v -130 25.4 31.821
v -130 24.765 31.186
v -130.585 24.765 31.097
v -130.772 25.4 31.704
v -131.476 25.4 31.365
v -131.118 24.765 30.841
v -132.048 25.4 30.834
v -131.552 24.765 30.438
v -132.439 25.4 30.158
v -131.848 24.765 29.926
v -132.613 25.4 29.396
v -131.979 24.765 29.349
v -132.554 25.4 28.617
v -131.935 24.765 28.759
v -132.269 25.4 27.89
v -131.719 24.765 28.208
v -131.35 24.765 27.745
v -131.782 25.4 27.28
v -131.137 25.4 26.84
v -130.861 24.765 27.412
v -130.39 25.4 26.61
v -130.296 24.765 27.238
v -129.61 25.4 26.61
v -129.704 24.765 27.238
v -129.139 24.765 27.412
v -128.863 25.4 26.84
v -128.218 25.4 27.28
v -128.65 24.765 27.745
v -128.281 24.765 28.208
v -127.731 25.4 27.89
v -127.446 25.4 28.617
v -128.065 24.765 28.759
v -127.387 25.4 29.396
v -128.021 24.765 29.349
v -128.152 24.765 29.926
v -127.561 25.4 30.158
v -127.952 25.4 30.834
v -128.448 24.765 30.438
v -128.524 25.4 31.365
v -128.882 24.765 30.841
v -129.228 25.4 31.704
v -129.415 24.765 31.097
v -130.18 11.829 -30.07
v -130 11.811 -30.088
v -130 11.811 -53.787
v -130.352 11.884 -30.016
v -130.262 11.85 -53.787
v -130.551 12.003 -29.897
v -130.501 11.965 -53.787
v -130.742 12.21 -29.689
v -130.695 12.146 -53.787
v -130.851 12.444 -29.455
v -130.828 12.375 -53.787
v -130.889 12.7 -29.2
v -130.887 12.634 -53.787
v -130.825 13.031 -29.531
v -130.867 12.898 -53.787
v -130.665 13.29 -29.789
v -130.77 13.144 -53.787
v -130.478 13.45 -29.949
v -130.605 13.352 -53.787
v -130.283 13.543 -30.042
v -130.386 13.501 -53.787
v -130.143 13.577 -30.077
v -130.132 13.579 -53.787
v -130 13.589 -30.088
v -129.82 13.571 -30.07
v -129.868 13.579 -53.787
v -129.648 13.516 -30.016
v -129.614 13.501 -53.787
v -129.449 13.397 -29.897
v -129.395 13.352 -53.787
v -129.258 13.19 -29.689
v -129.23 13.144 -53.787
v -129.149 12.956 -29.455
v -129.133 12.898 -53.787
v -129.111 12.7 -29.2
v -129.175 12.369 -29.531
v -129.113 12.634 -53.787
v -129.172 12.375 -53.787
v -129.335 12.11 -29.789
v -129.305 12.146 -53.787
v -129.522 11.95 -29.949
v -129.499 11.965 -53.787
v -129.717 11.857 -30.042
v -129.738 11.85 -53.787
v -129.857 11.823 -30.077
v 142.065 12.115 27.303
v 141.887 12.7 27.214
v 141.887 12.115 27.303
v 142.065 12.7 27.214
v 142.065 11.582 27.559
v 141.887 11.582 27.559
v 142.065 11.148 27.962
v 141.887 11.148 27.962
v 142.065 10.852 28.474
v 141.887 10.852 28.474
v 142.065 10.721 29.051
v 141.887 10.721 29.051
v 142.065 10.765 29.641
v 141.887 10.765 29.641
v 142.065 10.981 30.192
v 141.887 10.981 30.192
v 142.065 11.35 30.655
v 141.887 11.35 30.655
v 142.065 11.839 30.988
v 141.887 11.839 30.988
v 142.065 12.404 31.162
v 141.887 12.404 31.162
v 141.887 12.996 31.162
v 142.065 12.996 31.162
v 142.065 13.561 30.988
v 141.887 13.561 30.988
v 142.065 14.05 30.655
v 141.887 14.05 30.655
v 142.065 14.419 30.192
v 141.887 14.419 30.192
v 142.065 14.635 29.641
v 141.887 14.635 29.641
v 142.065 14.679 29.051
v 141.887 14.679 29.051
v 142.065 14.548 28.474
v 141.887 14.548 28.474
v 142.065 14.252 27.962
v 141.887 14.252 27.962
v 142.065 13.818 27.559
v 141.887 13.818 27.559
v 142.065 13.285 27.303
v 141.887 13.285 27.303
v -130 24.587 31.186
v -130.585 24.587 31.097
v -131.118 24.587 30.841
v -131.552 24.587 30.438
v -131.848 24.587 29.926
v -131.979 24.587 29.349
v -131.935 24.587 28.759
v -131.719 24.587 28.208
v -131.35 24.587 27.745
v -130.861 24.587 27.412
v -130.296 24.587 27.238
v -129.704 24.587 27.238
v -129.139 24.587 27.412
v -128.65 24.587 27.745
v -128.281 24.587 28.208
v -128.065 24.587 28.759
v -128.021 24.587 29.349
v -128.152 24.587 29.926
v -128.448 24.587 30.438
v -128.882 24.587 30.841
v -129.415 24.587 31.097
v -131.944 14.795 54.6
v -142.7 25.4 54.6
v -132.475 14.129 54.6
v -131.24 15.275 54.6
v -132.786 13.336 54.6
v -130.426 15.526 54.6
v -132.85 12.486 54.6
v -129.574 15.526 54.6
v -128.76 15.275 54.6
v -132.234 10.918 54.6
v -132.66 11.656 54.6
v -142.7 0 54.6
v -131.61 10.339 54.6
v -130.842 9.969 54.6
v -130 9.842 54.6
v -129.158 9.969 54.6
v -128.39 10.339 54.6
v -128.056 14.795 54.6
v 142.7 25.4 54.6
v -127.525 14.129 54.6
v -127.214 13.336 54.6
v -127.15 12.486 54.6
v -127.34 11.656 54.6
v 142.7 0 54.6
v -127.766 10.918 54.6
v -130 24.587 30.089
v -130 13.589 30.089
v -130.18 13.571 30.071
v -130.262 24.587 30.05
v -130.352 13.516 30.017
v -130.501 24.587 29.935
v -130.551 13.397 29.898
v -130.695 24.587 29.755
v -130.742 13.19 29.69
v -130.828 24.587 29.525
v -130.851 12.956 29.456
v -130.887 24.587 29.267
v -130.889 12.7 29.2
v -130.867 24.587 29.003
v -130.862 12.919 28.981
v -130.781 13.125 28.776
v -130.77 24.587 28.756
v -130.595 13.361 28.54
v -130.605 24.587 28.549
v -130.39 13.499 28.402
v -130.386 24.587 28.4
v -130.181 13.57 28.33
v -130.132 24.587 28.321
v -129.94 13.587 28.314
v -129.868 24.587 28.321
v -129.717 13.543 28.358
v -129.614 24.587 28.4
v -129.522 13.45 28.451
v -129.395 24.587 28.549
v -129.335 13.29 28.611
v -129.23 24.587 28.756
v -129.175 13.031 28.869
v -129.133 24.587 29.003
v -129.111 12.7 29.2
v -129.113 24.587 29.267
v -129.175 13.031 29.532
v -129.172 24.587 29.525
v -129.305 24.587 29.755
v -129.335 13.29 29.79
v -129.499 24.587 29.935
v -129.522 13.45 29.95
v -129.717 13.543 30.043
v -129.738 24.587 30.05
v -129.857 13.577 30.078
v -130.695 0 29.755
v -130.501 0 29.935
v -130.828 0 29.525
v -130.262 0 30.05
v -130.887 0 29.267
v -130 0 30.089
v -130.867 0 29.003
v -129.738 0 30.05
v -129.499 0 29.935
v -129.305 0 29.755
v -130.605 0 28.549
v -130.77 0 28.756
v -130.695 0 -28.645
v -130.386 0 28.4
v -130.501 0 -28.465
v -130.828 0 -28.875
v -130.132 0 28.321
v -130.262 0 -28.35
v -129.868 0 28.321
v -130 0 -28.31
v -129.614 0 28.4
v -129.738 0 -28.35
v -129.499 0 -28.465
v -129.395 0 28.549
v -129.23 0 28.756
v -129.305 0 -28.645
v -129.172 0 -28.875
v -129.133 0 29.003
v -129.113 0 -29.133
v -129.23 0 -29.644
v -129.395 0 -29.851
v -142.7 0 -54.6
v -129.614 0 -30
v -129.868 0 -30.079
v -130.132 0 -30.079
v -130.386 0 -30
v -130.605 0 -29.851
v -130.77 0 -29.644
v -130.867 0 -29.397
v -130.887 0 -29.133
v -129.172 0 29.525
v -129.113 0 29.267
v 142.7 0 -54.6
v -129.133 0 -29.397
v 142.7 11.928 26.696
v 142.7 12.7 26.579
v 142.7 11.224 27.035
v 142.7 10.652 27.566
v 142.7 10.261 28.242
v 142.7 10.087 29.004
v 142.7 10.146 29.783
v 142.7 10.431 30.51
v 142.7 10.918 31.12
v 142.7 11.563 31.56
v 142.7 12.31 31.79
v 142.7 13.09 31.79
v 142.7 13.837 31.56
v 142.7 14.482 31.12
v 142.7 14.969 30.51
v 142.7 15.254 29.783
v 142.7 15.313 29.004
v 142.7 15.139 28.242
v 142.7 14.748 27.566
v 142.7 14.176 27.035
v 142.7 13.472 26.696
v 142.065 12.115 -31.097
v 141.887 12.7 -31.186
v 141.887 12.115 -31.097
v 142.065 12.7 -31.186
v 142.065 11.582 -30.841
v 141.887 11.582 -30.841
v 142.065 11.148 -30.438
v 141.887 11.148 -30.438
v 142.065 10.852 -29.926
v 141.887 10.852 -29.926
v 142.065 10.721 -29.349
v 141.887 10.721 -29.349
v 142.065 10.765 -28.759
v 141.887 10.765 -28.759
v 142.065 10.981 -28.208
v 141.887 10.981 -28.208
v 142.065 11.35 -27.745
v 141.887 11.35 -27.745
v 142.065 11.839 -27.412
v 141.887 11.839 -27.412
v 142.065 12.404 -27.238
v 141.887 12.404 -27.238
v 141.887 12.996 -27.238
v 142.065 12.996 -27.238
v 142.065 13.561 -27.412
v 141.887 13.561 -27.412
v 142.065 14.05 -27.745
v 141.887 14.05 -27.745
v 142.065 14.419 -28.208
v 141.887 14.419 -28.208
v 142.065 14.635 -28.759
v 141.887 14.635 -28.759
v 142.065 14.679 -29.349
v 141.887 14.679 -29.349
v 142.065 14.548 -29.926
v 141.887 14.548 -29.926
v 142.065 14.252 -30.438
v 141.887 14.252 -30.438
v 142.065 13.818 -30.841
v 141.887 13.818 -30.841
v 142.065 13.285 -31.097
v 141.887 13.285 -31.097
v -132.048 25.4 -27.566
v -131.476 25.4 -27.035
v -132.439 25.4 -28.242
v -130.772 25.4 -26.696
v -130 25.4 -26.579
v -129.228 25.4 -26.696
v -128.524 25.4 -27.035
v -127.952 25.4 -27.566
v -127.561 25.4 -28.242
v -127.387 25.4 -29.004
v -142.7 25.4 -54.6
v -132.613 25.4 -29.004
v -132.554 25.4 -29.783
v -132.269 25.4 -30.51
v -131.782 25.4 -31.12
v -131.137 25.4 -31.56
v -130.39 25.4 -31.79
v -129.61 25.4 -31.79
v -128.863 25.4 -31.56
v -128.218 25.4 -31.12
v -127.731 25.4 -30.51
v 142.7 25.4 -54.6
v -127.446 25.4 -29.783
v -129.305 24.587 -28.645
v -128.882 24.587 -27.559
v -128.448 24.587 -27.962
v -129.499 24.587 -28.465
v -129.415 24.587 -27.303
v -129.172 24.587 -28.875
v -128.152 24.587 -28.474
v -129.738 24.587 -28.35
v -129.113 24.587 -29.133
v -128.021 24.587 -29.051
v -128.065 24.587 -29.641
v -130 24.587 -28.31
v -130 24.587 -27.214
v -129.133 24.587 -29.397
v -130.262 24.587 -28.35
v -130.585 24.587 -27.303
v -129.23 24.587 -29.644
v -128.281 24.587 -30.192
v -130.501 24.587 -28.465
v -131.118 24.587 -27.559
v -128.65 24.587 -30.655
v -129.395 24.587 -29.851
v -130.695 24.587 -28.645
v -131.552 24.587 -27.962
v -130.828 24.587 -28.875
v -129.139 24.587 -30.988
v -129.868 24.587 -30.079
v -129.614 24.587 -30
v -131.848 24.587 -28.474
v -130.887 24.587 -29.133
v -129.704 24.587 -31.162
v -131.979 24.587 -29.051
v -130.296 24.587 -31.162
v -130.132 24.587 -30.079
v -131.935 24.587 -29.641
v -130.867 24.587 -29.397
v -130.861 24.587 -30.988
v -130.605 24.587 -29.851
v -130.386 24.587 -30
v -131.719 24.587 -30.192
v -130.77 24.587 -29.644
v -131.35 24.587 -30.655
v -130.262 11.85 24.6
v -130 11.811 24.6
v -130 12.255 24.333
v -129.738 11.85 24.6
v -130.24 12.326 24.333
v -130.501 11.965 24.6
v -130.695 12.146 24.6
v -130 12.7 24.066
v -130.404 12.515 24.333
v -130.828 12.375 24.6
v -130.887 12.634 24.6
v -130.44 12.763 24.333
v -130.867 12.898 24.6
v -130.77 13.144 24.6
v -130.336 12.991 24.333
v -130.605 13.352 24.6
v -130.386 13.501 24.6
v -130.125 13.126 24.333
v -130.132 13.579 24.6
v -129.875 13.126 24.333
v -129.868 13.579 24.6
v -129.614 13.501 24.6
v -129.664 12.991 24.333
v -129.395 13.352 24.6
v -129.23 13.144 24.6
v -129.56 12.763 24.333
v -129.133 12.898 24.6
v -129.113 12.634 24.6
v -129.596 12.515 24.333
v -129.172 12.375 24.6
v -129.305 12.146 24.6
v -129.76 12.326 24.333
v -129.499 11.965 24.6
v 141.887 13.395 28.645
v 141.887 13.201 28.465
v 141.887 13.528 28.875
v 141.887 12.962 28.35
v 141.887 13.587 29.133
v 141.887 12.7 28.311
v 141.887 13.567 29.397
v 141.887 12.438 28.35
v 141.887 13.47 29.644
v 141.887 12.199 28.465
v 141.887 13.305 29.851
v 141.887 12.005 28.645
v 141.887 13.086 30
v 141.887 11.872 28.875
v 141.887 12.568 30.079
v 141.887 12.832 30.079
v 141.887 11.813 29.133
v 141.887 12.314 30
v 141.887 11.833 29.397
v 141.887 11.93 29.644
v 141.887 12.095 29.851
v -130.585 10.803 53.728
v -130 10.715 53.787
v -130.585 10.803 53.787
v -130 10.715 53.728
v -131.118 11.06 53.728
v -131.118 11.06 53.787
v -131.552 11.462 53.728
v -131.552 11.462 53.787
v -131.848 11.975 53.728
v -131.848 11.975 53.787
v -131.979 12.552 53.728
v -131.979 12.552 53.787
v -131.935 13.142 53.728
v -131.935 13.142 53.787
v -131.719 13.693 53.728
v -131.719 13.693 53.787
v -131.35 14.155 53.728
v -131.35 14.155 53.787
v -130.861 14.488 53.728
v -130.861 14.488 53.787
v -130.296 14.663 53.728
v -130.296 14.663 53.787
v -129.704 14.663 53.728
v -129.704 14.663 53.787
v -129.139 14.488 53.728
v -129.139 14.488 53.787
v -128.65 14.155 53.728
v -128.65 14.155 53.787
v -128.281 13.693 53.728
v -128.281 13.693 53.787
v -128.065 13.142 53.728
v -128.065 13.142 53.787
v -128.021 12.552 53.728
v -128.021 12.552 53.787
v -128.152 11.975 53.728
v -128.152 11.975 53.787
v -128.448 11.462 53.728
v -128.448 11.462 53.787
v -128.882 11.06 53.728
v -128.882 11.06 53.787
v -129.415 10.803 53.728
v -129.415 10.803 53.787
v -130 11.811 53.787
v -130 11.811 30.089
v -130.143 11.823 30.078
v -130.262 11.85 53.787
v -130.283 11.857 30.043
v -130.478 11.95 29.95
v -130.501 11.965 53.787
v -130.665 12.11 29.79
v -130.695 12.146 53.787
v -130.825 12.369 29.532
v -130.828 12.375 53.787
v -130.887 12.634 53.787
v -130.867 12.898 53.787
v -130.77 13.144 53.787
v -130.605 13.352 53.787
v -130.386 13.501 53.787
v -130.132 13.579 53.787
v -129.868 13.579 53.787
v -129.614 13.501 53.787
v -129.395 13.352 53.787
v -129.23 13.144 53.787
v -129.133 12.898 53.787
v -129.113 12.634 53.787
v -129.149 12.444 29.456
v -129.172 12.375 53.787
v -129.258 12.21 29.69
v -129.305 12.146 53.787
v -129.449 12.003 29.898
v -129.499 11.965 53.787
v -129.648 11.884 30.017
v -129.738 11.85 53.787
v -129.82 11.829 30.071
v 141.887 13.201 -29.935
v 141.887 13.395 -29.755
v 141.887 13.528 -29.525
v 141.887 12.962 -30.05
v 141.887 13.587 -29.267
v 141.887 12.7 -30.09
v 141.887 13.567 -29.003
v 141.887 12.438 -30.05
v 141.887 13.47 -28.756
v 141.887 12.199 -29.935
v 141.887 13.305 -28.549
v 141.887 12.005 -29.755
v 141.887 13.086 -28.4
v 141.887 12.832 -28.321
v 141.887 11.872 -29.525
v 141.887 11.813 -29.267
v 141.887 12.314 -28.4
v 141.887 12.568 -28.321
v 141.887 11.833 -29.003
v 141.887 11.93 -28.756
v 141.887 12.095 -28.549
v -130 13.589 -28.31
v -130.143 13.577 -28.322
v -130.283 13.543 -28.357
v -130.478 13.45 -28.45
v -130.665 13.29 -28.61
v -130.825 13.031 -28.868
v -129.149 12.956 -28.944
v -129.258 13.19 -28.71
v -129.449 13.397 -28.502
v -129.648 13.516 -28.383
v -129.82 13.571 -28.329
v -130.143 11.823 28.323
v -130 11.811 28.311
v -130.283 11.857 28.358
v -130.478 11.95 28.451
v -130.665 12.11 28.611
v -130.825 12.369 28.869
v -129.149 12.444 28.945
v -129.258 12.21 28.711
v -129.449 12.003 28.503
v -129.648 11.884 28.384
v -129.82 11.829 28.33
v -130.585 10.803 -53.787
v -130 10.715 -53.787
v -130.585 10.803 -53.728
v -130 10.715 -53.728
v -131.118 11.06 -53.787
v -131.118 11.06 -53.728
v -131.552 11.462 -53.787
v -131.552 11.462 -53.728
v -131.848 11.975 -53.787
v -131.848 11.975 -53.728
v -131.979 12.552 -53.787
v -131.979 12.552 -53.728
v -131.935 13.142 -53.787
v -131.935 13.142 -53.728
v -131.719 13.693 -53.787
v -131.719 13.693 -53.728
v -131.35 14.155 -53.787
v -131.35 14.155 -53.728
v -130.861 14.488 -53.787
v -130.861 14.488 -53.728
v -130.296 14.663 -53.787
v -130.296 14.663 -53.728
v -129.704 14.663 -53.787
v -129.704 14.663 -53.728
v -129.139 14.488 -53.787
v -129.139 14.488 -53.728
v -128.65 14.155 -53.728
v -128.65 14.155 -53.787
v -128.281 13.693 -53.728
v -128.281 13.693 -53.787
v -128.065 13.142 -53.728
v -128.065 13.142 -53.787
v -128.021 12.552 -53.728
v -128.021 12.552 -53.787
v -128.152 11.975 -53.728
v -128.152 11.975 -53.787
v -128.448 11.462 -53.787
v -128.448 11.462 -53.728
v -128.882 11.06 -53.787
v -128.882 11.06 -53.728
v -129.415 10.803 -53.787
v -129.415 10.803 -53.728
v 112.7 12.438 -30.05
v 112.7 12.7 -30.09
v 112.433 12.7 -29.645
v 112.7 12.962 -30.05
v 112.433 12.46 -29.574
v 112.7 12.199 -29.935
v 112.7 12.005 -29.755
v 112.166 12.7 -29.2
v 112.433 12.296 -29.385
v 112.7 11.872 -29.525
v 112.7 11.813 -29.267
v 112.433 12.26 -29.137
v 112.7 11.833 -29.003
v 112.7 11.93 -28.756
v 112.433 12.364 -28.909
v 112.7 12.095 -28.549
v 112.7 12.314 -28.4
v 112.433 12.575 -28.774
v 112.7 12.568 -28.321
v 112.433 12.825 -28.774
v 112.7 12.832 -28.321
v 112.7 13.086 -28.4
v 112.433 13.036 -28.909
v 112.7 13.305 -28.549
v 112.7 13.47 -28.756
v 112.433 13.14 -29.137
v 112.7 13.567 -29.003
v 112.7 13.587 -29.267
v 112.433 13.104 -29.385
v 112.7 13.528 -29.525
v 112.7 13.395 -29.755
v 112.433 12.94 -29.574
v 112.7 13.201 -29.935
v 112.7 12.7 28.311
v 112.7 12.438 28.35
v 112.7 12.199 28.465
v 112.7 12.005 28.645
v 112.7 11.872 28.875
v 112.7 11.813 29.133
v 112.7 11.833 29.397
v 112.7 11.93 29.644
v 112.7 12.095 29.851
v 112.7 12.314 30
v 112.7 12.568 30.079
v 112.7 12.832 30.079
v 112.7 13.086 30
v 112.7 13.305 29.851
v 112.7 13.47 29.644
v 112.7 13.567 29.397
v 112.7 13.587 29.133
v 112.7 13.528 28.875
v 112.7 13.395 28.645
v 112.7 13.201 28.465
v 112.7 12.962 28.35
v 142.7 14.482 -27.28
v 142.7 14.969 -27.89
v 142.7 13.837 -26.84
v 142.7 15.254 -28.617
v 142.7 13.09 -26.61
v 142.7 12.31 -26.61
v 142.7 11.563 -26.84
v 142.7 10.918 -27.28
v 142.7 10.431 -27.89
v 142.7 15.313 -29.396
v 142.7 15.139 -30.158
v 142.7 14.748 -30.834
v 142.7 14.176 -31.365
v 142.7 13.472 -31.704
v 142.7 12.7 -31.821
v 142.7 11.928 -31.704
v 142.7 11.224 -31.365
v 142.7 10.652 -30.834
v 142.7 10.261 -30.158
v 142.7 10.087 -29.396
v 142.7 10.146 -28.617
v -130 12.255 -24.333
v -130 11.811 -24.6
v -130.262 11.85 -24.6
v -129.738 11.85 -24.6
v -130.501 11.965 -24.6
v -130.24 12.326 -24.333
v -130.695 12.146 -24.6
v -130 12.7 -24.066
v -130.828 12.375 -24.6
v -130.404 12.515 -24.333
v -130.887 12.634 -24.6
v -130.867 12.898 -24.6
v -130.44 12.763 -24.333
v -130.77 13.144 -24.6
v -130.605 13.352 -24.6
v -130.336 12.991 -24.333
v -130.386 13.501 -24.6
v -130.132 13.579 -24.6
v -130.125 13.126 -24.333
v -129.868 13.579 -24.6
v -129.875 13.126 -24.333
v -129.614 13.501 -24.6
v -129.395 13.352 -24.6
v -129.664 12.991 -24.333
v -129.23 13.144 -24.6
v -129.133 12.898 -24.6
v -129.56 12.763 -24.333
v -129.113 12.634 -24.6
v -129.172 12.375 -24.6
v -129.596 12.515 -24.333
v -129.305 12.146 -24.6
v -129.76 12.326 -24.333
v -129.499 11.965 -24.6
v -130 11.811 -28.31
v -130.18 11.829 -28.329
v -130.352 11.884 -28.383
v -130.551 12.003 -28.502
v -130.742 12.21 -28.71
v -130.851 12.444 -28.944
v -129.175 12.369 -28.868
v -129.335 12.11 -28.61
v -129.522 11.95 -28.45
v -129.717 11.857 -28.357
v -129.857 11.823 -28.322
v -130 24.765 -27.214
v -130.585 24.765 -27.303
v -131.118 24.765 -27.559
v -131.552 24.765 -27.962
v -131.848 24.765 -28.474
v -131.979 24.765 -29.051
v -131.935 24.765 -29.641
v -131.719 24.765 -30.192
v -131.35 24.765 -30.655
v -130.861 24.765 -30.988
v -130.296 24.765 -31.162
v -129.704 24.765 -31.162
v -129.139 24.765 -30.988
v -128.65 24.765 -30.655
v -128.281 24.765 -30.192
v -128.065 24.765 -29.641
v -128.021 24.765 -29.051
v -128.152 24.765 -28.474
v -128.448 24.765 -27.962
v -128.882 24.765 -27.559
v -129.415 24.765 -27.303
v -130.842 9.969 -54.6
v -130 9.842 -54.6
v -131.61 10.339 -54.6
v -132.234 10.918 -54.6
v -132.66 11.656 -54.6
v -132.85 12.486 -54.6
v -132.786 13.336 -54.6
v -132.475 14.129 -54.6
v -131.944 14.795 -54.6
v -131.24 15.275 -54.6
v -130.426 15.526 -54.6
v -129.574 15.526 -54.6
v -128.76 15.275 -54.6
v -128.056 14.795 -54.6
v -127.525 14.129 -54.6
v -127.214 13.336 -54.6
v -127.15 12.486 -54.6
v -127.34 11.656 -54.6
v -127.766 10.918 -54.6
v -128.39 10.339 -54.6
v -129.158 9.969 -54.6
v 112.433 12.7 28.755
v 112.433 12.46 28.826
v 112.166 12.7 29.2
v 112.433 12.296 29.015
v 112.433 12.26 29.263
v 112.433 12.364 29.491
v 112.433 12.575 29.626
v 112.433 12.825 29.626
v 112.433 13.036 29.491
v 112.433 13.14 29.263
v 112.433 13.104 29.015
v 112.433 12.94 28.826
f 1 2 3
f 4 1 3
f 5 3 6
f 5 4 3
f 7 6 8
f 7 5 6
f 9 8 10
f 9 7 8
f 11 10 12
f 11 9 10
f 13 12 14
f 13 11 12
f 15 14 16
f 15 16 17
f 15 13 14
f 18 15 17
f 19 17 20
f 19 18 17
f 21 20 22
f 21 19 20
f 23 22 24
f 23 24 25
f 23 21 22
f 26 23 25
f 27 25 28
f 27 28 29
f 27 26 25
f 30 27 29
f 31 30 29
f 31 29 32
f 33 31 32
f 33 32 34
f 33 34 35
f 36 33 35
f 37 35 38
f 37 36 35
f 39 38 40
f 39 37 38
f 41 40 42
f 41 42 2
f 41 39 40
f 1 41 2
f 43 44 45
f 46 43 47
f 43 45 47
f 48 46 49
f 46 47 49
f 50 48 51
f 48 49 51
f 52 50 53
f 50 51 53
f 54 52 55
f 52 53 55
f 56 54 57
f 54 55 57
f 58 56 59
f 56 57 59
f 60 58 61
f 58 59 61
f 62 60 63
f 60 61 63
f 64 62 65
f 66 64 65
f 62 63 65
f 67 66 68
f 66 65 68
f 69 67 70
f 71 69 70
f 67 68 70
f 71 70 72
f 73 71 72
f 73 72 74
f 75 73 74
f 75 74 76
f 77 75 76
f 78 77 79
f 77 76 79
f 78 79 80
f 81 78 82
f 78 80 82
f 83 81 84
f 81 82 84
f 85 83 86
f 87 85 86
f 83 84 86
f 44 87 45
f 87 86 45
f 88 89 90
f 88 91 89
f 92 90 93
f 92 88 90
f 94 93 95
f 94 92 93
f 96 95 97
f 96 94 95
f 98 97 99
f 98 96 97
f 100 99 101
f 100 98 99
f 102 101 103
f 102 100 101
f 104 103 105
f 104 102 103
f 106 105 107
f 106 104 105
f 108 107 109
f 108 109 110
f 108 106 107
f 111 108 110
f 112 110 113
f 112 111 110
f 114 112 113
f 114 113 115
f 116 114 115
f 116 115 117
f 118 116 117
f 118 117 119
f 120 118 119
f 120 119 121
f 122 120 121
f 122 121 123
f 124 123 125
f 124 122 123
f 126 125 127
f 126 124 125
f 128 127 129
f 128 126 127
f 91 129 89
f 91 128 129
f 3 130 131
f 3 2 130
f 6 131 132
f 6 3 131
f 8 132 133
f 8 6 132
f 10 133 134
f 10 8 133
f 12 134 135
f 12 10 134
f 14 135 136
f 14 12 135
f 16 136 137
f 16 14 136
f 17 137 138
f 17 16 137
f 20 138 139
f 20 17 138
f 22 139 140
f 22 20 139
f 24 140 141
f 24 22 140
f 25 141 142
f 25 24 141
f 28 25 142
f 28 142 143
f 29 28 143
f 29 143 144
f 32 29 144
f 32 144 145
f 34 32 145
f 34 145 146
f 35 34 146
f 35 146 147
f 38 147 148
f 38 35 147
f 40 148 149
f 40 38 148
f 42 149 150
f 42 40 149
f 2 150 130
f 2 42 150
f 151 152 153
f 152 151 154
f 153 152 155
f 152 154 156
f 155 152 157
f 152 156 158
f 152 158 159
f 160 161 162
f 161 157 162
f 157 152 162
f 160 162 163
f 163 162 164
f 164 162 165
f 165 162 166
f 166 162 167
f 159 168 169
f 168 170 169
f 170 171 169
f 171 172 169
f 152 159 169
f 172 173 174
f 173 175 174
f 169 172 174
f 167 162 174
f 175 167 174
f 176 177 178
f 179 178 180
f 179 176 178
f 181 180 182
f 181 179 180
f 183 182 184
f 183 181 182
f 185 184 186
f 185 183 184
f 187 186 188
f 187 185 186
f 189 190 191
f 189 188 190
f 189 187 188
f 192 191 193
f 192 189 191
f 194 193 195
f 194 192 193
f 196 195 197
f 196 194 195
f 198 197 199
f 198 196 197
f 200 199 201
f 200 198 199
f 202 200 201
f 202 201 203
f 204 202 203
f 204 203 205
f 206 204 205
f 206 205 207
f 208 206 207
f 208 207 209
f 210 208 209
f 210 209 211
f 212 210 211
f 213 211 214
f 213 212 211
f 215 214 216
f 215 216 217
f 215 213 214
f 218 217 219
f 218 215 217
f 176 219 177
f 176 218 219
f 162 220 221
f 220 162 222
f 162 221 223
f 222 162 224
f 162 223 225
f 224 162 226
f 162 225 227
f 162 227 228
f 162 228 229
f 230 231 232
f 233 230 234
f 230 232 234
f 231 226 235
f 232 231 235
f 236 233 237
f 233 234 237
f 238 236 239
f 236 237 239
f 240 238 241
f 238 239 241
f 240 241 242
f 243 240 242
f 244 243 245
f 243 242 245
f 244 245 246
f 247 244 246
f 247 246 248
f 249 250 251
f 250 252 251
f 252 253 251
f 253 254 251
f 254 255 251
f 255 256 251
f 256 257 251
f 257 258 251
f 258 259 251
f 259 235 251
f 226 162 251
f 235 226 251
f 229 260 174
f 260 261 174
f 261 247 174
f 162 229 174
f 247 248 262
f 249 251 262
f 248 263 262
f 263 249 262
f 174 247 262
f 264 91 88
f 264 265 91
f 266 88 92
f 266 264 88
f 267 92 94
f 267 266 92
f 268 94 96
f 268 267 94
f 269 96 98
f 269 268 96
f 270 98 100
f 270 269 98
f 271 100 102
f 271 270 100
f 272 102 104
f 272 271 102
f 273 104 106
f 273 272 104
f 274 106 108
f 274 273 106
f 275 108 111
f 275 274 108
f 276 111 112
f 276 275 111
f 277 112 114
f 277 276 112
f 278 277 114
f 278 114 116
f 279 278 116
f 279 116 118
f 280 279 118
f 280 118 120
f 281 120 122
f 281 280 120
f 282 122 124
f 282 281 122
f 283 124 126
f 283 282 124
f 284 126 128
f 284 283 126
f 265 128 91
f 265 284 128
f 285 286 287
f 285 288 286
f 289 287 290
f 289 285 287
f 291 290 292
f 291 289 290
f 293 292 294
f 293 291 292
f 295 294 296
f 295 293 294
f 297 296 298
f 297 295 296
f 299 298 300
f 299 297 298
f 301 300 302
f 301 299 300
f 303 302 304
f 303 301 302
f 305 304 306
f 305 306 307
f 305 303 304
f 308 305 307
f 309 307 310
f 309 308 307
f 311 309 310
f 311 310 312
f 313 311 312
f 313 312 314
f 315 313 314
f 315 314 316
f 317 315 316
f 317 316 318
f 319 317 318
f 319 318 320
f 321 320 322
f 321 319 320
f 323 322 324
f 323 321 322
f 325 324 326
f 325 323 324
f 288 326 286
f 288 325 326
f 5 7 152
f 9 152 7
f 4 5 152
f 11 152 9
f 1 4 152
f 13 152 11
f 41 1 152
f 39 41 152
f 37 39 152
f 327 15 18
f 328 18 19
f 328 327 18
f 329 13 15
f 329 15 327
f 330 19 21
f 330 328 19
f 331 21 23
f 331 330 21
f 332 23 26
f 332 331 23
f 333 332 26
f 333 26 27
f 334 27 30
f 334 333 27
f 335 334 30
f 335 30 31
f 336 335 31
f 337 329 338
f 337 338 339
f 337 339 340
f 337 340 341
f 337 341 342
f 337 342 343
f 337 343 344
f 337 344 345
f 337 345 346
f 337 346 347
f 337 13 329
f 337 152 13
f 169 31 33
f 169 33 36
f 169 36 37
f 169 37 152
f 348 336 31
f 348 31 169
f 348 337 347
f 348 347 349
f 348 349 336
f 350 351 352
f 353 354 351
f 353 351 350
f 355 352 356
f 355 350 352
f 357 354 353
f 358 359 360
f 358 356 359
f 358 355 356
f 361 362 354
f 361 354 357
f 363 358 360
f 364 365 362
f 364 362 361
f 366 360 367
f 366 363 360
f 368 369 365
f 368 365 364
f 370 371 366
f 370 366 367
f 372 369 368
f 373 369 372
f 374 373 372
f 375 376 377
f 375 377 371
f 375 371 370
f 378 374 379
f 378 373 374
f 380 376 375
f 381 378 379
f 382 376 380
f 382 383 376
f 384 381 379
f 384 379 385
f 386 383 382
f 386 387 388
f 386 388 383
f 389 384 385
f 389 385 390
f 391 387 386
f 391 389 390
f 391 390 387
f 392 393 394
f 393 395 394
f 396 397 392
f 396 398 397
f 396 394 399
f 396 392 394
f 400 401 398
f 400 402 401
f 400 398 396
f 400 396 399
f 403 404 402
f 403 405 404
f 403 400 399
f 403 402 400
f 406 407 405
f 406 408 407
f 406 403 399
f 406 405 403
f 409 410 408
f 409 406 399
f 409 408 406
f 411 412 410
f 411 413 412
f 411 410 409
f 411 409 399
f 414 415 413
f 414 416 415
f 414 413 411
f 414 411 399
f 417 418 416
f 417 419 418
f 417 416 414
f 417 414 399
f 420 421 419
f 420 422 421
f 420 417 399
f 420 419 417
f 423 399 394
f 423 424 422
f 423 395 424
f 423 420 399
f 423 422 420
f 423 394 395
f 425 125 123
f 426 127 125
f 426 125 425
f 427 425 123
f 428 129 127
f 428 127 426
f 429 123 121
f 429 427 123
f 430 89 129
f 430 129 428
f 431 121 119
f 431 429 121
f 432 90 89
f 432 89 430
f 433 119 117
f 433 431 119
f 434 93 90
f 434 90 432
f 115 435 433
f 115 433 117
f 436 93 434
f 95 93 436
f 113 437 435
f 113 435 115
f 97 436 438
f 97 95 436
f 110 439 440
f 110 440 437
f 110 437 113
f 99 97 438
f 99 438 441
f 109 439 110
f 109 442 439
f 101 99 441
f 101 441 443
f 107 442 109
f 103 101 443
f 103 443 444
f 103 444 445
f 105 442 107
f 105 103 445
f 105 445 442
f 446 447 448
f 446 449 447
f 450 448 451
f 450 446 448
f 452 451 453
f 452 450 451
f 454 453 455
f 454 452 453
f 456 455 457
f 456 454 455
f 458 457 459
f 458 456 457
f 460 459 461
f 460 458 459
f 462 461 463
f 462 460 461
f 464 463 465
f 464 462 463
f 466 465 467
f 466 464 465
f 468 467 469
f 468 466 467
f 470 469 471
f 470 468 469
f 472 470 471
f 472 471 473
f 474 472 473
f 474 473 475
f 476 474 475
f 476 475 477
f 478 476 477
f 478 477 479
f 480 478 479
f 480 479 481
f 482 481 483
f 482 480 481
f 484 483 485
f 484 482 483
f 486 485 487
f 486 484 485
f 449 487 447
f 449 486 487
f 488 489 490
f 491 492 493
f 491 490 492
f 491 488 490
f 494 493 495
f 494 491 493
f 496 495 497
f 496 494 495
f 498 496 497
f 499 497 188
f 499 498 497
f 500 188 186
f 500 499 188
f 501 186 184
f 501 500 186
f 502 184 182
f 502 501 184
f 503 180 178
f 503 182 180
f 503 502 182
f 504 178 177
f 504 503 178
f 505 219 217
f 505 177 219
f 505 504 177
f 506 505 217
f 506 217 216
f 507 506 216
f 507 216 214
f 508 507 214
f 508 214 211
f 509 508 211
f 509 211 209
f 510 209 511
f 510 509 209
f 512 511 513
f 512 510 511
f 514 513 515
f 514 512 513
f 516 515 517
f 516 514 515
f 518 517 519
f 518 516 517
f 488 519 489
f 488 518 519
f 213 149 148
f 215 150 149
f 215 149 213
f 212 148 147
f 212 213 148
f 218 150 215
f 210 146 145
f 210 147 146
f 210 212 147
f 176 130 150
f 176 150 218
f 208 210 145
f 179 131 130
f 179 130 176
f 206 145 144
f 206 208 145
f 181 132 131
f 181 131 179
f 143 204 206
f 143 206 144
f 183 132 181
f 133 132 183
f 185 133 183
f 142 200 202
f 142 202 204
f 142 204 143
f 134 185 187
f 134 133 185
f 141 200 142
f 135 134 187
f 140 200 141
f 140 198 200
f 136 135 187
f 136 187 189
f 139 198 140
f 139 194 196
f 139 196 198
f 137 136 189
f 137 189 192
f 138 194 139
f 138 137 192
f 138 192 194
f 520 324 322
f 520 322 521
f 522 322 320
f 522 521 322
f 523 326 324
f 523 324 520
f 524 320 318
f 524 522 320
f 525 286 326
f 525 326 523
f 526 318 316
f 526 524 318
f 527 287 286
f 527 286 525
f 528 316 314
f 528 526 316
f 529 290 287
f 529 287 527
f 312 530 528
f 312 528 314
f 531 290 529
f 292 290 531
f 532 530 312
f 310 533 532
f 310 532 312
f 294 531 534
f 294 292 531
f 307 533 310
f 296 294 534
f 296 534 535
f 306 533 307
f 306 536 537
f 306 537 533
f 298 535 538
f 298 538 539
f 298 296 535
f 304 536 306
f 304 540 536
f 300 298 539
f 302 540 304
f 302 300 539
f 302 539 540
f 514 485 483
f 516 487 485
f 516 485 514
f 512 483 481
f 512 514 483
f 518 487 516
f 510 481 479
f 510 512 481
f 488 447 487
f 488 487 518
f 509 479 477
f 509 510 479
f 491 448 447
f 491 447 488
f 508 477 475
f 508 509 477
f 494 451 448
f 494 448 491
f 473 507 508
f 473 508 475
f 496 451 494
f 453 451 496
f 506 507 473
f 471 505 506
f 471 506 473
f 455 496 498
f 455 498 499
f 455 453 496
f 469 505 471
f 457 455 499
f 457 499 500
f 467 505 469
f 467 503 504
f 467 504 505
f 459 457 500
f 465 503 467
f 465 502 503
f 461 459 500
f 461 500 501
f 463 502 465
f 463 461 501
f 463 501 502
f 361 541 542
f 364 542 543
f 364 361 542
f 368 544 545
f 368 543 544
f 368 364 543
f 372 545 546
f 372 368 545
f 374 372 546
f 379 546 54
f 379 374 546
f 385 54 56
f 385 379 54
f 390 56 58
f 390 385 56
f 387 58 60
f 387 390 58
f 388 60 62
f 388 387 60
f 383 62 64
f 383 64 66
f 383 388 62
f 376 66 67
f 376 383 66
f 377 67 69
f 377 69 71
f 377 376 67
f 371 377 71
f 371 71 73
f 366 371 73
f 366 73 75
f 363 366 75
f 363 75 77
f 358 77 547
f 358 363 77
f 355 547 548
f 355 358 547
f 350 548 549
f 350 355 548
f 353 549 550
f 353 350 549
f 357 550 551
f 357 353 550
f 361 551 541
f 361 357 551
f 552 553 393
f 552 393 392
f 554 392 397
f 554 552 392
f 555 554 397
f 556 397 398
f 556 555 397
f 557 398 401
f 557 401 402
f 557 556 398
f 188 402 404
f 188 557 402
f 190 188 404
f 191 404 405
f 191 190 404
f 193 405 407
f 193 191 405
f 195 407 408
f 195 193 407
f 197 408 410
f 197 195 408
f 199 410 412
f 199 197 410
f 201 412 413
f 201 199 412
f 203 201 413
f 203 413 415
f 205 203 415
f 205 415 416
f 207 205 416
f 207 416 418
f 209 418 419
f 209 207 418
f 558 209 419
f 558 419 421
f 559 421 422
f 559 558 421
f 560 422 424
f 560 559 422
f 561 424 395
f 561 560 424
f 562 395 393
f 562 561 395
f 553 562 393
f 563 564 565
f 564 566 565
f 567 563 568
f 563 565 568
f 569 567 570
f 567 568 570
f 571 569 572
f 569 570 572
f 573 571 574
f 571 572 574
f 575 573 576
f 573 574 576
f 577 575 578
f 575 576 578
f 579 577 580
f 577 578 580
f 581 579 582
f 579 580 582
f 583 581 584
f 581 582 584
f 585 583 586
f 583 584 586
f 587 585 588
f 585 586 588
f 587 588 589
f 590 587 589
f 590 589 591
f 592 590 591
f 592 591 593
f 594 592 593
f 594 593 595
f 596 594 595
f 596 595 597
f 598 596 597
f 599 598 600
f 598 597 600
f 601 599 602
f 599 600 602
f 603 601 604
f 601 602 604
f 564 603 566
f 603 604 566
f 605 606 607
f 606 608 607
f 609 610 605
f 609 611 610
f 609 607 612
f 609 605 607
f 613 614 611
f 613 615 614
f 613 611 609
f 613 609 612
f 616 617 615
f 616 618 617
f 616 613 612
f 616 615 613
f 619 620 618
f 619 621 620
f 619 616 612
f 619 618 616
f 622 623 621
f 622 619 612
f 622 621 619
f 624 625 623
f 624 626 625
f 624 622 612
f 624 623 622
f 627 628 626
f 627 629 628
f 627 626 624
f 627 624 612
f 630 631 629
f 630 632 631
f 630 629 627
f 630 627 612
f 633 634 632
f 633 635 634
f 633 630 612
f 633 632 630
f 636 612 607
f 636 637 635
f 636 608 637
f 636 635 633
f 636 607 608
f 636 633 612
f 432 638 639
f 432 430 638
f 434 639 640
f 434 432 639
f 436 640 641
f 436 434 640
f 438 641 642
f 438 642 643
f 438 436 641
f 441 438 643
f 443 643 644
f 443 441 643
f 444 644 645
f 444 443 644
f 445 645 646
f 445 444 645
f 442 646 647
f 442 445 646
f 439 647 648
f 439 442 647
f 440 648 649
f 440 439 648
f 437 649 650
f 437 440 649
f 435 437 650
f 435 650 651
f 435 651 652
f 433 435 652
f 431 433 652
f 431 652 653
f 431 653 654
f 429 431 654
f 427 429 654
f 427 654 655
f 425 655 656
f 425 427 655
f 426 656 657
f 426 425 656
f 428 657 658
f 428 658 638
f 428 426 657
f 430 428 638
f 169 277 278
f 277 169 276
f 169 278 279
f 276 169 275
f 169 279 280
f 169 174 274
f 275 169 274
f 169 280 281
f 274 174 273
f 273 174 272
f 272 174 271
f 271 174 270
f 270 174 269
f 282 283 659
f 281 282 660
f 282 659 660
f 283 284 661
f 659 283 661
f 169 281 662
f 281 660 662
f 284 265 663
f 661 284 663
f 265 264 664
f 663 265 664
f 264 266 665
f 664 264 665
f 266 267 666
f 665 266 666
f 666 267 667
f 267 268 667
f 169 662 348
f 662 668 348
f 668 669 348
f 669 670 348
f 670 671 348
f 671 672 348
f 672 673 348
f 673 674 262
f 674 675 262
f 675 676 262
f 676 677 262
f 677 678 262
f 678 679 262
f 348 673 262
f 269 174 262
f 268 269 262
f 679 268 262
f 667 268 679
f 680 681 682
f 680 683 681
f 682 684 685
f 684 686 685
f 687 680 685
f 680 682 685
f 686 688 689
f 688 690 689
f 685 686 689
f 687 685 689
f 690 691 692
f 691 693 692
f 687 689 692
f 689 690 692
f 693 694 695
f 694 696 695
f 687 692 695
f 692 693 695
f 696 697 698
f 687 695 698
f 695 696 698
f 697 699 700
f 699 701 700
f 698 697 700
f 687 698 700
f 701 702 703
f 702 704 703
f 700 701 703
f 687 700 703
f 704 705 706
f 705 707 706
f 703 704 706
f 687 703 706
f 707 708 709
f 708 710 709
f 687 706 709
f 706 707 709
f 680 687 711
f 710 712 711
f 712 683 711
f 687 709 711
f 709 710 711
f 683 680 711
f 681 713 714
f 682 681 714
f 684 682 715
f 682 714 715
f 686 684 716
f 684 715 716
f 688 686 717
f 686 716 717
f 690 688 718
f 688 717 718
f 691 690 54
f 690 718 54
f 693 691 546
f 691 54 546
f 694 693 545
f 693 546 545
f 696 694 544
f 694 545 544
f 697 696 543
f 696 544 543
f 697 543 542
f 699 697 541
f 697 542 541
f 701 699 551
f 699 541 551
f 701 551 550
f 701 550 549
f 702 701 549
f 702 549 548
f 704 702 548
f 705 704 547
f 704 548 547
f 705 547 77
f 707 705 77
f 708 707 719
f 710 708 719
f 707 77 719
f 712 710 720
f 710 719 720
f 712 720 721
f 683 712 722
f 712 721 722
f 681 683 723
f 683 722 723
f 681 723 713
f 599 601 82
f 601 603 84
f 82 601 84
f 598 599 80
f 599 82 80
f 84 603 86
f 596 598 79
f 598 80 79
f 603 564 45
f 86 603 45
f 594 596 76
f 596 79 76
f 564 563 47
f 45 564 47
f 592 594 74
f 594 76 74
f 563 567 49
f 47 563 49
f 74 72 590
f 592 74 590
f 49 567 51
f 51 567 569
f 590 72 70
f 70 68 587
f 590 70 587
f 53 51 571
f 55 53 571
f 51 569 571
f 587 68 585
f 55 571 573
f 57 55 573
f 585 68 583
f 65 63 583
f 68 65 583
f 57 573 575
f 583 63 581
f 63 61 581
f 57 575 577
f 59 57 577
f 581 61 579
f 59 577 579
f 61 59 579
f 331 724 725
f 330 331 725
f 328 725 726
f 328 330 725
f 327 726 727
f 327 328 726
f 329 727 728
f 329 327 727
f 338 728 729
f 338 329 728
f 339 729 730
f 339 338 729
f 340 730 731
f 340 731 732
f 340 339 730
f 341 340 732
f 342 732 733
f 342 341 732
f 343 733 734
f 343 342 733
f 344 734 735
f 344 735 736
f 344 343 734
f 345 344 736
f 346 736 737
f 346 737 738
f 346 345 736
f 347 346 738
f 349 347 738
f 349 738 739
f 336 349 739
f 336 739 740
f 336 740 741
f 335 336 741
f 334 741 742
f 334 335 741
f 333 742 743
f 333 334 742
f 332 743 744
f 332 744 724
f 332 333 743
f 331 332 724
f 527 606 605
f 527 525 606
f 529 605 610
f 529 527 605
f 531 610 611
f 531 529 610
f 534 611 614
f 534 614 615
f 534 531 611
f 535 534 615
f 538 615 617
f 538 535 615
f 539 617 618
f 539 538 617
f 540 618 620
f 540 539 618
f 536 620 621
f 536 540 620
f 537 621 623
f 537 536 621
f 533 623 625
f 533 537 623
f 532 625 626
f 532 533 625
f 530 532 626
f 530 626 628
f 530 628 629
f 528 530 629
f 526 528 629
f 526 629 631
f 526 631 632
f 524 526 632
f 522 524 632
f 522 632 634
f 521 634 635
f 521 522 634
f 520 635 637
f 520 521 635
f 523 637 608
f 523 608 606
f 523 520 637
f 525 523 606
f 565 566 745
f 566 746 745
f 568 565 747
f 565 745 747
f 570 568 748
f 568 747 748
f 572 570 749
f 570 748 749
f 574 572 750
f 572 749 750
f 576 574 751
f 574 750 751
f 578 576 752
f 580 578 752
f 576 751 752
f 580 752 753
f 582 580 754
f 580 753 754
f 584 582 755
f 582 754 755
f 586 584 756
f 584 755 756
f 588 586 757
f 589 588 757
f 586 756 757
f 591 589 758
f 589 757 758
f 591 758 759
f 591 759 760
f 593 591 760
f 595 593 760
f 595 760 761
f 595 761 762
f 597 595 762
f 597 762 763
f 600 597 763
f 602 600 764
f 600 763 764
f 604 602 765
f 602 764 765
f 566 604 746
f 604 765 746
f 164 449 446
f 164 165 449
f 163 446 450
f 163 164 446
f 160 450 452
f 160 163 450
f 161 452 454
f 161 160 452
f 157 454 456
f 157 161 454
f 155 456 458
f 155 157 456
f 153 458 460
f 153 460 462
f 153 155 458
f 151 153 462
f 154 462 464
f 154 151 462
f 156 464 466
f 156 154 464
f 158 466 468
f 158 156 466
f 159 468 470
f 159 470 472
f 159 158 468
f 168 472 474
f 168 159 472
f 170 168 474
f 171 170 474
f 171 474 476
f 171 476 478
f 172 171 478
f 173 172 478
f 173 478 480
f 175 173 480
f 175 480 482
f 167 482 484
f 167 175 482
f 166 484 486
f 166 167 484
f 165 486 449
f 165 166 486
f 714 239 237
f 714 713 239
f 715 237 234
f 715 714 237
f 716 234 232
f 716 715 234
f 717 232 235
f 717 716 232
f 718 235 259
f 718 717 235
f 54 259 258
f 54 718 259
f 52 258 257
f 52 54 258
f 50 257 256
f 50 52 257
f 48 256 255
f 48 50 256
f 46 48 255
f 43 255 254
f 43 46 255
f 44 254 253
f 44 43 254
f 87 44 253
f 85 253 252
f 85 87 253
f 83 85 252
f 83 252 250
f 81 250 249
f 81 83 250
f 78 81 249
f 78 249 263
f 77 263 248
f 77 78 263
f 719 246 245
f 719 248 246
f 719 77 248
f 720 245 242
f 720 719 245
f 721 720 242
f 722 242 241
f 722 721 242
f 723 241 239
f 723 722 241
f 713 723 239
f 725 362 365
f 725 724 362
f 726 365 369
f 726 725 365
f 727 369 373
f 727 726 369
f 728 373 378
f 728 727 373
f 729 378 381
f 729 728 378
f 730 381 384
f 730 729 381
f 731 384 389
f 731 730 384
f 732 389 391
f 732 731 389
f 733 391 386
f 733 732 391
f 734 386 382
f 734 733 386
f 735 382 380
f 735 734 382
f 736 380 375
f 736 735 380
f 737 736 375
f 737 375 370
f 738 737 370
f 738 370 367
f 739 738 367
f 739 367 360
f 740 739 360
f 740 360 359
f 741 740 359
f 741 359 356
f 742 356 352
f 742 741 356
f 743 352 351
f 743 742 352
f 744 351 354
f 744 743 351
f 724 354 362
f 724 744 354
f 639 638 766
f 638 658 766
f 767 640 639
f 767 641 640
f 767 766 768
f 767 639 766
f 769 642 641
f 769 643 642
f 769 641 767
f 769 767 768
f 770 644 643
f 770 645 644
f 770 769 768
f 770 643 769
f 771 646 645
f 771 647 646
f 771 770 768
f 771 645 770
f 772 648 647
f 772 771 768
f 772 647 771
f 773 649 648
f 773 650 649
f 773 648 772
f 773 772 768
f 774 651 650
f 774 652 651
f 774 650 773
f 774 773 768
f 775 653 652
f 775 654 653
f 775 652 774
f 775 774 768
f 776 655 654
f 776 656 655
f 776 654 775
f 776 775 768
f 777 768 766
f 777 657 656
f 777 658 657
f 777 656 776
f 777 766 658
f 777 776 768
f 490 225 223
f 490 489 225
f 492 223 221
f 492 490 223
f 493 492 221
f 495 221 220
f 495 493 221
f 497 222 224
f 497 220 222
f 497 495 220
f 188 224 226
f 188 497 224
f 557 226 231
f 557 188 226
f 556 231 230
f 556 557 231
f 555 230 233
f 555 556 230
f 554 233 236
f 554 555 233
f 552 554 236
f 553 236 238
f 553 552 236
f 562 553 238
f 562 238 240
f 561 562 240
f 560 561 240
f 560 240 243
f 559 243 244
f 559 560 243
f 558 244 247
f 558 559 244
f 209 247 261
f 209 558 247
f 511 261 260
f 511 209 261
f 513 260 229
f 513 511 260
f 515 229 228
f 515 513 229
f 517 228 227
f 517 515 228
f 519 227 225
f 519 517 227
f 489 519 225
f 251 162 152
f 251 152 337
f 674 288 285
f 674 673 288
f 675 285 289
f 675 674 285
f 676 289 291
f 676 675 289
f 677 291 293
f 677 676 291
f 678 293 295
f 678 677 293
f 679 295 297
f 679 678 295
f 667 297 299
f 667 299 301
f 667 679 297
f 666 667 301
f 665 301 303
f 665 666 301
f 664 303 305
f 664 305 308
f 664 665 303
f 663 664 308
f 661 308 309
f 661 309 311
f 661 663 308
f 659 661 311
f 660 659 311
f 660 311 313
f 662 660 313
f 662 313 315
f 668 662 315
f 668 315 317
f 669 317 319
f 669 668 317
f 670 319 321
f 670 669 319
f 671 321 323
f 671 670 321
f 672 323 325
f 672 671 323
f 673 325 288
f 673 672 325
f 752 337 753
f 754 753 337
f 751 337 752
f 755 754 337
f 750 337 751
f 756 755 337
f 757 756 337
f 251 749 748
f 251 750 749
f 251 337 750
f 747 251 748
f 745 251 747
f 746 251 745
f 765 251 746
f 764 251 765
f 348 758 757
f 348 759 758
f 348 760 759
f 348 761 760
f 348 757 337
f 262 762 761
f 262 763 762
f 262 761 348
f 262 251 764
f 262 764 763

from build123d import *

# Parameters (mm, degrees)
SKETCH1_W                                   = 285.4
SKETCH1_H                                   = 109.2
BOSS_EXTRUDE1_DEPTH                         = 25.4
CBORE_FOR_0_BINDING_HEAD_MACHINE_SC_2_COUNT = 2
CBORE_FOR_0_BINDING_HEAD_MACHINE_SC_2_PITCH = 58.405486046
CBORE_FOR_0_BINDING_HEAD_MACHINE_SC_3_COUNT = 2
CBORE_FOR_0_BINDING_HEAD_MACHINE_SC_3_PITCH = 58.4
LPATTERN1_COUNT                             = 2
LPATTERN1_PITCH                             = 58.4


with BuildPart() as part:
    # Sketch1 → Boss-Extrude1 (new body)
    with BuildSketch(Plane(origin=(0, 0, 0), x_dir=(1, 0, 0), z_dir=(0, 1, 0))):
        Rectangle(SKETCH1_W, SKETCH1_H)
    extrude(amount=BOSS_EXTRUDE1_DEPTH)

    # Sketch3 → CBORE for #0 Binding Head Machine Screw1 (revolve, cut)
    with BuildSketch(Plane(origin=(-130, 12.7, 54.6), x_dir=(0, -1, 0), z_dir=(1, 0, 0))):
        Polygon((0, 0), (0, 30.53416509), (0.889, 30), (0.889, 0.8128), (1.98501, 0.8128), (1.98501, 0.87249), (2.8575, 0), align=None)
    cbore_for_0_binding_head_machine_screw1 = revolve(axis=Axis((-130, 12.7, 60.95), (0, 0, -1)), mode=Mode.SUBTRACT)

    # Mirror1: CBORE for #0 Binding Head Machine Screw1 across plane
    add(cbore_for_0_binding_head_machine_screw1.mirror(Plane.XY), mode=Mode.SUBTRACT)

    # Sketch5 → CBORE for #0 Binding Head Machine Screw2 (revolve, cut)
    with BuildSketch(Plane(origin=(142.7, -45.7, 30), x_dir=(0, 0, -1), z_dir=(0, 1, 0))):
        Polygon((0, 0), (0, 30.53416509), (0.889, 30), (0.889, 0.8128), (1.98501, 0.8128), (1.98501, 0.635), (2.62001, 0), align=None)
    cbore_for_0_binding_head_machine_screw2 = revolve(axis=Axis((149.05, -45.7, 30), (-1, 0, 0)), mode=Mode.SUBTRACT)

    # CBORE for _0 Binding Head Machine Sc 2: CBORE for #0 Binding Head Machine Screw2 ×2
    with Locations(*[Vector(0, 0.99990607, -0.013705904) * (i * CBORE_FOR_0_BINDING_HEAD_MACHINE_SC_2_PITCH) for i in range(1, CBORE_FOR_0_BINDING_HEAD_MACHINE_SC_2_COUNT)]):
        add(cbore_for_0_binding_head_machine_screw2, mode=Mode.SUBTRACT)

    # Sketch7 → CBORE for #0 Binding Head Machine Screw3 (revolve, cut)
    with BuildSketch(Plane(origin=(-130, 25.4, -29.1995), x_dir=(0, 0, 1), z_dir=(1, 0, 0))):
        Polygon((0, 0), (0, 30.53416509), (0.889, 30), (0.889, 0.8128), (1.98501, 0.8128), (1.98501, 0.635), (2.62001, 0), align=None)
    cbore_for_0_binding_head_machine_screw3 = revolve(axis=Axis((-130, 31.75, -29.1995), (0, -1, 0)), mode=Mode.SUBTRACT)

    # CBORE for _0 Binding Head Machine Sc 3: CBORE for #0 Binding Head Machine Screw3 ×2
    with Locations(*[(0, 0, i * CBORE_FOR_0_BINDING_HEAD_MACHINE_SC_3_PITCH) for i in range(1, CBORE_FOR_0_BINDING_HEAD_MACHINE_SC_3_COUNT)]):
        add(cbore_for_0_binding_head_machine_screw3, mode=Mode.SUBTRACT)

    # LPattern1: CBORE for #0 Binding Head Machine Screw2 ×2
    with Locations(*[(0, 0, -i * LPATTERN1_PITCH) for i in range(1, LPATTERN1_COUNT)]):
        add(cbore_for_0_binding_head_machine_screw2, mode=Mode.SUBTRACT)

    # LPattern1 copy 1 sketch → LPattern1 copy 1 (revolve, cut)
    with BuildSketch(Plane(origin=(142.7, 12.7, -29.2005), x_dir=(0, 0, -1), z_dir=(0, 1, 0))):
        Polygon((0, 0), (0, 30.53416509), (0.889, 30), (0.889, 0.8128), (1.98501, 0.8128), (1.98501, 0.635), (2.62001, 0), align=None)
    revolve(axis=Axis((149.05, 12.7, -29.2005), (-1, 0, 0)), mode=Mode.SUBTRACT)


solid = part.part
